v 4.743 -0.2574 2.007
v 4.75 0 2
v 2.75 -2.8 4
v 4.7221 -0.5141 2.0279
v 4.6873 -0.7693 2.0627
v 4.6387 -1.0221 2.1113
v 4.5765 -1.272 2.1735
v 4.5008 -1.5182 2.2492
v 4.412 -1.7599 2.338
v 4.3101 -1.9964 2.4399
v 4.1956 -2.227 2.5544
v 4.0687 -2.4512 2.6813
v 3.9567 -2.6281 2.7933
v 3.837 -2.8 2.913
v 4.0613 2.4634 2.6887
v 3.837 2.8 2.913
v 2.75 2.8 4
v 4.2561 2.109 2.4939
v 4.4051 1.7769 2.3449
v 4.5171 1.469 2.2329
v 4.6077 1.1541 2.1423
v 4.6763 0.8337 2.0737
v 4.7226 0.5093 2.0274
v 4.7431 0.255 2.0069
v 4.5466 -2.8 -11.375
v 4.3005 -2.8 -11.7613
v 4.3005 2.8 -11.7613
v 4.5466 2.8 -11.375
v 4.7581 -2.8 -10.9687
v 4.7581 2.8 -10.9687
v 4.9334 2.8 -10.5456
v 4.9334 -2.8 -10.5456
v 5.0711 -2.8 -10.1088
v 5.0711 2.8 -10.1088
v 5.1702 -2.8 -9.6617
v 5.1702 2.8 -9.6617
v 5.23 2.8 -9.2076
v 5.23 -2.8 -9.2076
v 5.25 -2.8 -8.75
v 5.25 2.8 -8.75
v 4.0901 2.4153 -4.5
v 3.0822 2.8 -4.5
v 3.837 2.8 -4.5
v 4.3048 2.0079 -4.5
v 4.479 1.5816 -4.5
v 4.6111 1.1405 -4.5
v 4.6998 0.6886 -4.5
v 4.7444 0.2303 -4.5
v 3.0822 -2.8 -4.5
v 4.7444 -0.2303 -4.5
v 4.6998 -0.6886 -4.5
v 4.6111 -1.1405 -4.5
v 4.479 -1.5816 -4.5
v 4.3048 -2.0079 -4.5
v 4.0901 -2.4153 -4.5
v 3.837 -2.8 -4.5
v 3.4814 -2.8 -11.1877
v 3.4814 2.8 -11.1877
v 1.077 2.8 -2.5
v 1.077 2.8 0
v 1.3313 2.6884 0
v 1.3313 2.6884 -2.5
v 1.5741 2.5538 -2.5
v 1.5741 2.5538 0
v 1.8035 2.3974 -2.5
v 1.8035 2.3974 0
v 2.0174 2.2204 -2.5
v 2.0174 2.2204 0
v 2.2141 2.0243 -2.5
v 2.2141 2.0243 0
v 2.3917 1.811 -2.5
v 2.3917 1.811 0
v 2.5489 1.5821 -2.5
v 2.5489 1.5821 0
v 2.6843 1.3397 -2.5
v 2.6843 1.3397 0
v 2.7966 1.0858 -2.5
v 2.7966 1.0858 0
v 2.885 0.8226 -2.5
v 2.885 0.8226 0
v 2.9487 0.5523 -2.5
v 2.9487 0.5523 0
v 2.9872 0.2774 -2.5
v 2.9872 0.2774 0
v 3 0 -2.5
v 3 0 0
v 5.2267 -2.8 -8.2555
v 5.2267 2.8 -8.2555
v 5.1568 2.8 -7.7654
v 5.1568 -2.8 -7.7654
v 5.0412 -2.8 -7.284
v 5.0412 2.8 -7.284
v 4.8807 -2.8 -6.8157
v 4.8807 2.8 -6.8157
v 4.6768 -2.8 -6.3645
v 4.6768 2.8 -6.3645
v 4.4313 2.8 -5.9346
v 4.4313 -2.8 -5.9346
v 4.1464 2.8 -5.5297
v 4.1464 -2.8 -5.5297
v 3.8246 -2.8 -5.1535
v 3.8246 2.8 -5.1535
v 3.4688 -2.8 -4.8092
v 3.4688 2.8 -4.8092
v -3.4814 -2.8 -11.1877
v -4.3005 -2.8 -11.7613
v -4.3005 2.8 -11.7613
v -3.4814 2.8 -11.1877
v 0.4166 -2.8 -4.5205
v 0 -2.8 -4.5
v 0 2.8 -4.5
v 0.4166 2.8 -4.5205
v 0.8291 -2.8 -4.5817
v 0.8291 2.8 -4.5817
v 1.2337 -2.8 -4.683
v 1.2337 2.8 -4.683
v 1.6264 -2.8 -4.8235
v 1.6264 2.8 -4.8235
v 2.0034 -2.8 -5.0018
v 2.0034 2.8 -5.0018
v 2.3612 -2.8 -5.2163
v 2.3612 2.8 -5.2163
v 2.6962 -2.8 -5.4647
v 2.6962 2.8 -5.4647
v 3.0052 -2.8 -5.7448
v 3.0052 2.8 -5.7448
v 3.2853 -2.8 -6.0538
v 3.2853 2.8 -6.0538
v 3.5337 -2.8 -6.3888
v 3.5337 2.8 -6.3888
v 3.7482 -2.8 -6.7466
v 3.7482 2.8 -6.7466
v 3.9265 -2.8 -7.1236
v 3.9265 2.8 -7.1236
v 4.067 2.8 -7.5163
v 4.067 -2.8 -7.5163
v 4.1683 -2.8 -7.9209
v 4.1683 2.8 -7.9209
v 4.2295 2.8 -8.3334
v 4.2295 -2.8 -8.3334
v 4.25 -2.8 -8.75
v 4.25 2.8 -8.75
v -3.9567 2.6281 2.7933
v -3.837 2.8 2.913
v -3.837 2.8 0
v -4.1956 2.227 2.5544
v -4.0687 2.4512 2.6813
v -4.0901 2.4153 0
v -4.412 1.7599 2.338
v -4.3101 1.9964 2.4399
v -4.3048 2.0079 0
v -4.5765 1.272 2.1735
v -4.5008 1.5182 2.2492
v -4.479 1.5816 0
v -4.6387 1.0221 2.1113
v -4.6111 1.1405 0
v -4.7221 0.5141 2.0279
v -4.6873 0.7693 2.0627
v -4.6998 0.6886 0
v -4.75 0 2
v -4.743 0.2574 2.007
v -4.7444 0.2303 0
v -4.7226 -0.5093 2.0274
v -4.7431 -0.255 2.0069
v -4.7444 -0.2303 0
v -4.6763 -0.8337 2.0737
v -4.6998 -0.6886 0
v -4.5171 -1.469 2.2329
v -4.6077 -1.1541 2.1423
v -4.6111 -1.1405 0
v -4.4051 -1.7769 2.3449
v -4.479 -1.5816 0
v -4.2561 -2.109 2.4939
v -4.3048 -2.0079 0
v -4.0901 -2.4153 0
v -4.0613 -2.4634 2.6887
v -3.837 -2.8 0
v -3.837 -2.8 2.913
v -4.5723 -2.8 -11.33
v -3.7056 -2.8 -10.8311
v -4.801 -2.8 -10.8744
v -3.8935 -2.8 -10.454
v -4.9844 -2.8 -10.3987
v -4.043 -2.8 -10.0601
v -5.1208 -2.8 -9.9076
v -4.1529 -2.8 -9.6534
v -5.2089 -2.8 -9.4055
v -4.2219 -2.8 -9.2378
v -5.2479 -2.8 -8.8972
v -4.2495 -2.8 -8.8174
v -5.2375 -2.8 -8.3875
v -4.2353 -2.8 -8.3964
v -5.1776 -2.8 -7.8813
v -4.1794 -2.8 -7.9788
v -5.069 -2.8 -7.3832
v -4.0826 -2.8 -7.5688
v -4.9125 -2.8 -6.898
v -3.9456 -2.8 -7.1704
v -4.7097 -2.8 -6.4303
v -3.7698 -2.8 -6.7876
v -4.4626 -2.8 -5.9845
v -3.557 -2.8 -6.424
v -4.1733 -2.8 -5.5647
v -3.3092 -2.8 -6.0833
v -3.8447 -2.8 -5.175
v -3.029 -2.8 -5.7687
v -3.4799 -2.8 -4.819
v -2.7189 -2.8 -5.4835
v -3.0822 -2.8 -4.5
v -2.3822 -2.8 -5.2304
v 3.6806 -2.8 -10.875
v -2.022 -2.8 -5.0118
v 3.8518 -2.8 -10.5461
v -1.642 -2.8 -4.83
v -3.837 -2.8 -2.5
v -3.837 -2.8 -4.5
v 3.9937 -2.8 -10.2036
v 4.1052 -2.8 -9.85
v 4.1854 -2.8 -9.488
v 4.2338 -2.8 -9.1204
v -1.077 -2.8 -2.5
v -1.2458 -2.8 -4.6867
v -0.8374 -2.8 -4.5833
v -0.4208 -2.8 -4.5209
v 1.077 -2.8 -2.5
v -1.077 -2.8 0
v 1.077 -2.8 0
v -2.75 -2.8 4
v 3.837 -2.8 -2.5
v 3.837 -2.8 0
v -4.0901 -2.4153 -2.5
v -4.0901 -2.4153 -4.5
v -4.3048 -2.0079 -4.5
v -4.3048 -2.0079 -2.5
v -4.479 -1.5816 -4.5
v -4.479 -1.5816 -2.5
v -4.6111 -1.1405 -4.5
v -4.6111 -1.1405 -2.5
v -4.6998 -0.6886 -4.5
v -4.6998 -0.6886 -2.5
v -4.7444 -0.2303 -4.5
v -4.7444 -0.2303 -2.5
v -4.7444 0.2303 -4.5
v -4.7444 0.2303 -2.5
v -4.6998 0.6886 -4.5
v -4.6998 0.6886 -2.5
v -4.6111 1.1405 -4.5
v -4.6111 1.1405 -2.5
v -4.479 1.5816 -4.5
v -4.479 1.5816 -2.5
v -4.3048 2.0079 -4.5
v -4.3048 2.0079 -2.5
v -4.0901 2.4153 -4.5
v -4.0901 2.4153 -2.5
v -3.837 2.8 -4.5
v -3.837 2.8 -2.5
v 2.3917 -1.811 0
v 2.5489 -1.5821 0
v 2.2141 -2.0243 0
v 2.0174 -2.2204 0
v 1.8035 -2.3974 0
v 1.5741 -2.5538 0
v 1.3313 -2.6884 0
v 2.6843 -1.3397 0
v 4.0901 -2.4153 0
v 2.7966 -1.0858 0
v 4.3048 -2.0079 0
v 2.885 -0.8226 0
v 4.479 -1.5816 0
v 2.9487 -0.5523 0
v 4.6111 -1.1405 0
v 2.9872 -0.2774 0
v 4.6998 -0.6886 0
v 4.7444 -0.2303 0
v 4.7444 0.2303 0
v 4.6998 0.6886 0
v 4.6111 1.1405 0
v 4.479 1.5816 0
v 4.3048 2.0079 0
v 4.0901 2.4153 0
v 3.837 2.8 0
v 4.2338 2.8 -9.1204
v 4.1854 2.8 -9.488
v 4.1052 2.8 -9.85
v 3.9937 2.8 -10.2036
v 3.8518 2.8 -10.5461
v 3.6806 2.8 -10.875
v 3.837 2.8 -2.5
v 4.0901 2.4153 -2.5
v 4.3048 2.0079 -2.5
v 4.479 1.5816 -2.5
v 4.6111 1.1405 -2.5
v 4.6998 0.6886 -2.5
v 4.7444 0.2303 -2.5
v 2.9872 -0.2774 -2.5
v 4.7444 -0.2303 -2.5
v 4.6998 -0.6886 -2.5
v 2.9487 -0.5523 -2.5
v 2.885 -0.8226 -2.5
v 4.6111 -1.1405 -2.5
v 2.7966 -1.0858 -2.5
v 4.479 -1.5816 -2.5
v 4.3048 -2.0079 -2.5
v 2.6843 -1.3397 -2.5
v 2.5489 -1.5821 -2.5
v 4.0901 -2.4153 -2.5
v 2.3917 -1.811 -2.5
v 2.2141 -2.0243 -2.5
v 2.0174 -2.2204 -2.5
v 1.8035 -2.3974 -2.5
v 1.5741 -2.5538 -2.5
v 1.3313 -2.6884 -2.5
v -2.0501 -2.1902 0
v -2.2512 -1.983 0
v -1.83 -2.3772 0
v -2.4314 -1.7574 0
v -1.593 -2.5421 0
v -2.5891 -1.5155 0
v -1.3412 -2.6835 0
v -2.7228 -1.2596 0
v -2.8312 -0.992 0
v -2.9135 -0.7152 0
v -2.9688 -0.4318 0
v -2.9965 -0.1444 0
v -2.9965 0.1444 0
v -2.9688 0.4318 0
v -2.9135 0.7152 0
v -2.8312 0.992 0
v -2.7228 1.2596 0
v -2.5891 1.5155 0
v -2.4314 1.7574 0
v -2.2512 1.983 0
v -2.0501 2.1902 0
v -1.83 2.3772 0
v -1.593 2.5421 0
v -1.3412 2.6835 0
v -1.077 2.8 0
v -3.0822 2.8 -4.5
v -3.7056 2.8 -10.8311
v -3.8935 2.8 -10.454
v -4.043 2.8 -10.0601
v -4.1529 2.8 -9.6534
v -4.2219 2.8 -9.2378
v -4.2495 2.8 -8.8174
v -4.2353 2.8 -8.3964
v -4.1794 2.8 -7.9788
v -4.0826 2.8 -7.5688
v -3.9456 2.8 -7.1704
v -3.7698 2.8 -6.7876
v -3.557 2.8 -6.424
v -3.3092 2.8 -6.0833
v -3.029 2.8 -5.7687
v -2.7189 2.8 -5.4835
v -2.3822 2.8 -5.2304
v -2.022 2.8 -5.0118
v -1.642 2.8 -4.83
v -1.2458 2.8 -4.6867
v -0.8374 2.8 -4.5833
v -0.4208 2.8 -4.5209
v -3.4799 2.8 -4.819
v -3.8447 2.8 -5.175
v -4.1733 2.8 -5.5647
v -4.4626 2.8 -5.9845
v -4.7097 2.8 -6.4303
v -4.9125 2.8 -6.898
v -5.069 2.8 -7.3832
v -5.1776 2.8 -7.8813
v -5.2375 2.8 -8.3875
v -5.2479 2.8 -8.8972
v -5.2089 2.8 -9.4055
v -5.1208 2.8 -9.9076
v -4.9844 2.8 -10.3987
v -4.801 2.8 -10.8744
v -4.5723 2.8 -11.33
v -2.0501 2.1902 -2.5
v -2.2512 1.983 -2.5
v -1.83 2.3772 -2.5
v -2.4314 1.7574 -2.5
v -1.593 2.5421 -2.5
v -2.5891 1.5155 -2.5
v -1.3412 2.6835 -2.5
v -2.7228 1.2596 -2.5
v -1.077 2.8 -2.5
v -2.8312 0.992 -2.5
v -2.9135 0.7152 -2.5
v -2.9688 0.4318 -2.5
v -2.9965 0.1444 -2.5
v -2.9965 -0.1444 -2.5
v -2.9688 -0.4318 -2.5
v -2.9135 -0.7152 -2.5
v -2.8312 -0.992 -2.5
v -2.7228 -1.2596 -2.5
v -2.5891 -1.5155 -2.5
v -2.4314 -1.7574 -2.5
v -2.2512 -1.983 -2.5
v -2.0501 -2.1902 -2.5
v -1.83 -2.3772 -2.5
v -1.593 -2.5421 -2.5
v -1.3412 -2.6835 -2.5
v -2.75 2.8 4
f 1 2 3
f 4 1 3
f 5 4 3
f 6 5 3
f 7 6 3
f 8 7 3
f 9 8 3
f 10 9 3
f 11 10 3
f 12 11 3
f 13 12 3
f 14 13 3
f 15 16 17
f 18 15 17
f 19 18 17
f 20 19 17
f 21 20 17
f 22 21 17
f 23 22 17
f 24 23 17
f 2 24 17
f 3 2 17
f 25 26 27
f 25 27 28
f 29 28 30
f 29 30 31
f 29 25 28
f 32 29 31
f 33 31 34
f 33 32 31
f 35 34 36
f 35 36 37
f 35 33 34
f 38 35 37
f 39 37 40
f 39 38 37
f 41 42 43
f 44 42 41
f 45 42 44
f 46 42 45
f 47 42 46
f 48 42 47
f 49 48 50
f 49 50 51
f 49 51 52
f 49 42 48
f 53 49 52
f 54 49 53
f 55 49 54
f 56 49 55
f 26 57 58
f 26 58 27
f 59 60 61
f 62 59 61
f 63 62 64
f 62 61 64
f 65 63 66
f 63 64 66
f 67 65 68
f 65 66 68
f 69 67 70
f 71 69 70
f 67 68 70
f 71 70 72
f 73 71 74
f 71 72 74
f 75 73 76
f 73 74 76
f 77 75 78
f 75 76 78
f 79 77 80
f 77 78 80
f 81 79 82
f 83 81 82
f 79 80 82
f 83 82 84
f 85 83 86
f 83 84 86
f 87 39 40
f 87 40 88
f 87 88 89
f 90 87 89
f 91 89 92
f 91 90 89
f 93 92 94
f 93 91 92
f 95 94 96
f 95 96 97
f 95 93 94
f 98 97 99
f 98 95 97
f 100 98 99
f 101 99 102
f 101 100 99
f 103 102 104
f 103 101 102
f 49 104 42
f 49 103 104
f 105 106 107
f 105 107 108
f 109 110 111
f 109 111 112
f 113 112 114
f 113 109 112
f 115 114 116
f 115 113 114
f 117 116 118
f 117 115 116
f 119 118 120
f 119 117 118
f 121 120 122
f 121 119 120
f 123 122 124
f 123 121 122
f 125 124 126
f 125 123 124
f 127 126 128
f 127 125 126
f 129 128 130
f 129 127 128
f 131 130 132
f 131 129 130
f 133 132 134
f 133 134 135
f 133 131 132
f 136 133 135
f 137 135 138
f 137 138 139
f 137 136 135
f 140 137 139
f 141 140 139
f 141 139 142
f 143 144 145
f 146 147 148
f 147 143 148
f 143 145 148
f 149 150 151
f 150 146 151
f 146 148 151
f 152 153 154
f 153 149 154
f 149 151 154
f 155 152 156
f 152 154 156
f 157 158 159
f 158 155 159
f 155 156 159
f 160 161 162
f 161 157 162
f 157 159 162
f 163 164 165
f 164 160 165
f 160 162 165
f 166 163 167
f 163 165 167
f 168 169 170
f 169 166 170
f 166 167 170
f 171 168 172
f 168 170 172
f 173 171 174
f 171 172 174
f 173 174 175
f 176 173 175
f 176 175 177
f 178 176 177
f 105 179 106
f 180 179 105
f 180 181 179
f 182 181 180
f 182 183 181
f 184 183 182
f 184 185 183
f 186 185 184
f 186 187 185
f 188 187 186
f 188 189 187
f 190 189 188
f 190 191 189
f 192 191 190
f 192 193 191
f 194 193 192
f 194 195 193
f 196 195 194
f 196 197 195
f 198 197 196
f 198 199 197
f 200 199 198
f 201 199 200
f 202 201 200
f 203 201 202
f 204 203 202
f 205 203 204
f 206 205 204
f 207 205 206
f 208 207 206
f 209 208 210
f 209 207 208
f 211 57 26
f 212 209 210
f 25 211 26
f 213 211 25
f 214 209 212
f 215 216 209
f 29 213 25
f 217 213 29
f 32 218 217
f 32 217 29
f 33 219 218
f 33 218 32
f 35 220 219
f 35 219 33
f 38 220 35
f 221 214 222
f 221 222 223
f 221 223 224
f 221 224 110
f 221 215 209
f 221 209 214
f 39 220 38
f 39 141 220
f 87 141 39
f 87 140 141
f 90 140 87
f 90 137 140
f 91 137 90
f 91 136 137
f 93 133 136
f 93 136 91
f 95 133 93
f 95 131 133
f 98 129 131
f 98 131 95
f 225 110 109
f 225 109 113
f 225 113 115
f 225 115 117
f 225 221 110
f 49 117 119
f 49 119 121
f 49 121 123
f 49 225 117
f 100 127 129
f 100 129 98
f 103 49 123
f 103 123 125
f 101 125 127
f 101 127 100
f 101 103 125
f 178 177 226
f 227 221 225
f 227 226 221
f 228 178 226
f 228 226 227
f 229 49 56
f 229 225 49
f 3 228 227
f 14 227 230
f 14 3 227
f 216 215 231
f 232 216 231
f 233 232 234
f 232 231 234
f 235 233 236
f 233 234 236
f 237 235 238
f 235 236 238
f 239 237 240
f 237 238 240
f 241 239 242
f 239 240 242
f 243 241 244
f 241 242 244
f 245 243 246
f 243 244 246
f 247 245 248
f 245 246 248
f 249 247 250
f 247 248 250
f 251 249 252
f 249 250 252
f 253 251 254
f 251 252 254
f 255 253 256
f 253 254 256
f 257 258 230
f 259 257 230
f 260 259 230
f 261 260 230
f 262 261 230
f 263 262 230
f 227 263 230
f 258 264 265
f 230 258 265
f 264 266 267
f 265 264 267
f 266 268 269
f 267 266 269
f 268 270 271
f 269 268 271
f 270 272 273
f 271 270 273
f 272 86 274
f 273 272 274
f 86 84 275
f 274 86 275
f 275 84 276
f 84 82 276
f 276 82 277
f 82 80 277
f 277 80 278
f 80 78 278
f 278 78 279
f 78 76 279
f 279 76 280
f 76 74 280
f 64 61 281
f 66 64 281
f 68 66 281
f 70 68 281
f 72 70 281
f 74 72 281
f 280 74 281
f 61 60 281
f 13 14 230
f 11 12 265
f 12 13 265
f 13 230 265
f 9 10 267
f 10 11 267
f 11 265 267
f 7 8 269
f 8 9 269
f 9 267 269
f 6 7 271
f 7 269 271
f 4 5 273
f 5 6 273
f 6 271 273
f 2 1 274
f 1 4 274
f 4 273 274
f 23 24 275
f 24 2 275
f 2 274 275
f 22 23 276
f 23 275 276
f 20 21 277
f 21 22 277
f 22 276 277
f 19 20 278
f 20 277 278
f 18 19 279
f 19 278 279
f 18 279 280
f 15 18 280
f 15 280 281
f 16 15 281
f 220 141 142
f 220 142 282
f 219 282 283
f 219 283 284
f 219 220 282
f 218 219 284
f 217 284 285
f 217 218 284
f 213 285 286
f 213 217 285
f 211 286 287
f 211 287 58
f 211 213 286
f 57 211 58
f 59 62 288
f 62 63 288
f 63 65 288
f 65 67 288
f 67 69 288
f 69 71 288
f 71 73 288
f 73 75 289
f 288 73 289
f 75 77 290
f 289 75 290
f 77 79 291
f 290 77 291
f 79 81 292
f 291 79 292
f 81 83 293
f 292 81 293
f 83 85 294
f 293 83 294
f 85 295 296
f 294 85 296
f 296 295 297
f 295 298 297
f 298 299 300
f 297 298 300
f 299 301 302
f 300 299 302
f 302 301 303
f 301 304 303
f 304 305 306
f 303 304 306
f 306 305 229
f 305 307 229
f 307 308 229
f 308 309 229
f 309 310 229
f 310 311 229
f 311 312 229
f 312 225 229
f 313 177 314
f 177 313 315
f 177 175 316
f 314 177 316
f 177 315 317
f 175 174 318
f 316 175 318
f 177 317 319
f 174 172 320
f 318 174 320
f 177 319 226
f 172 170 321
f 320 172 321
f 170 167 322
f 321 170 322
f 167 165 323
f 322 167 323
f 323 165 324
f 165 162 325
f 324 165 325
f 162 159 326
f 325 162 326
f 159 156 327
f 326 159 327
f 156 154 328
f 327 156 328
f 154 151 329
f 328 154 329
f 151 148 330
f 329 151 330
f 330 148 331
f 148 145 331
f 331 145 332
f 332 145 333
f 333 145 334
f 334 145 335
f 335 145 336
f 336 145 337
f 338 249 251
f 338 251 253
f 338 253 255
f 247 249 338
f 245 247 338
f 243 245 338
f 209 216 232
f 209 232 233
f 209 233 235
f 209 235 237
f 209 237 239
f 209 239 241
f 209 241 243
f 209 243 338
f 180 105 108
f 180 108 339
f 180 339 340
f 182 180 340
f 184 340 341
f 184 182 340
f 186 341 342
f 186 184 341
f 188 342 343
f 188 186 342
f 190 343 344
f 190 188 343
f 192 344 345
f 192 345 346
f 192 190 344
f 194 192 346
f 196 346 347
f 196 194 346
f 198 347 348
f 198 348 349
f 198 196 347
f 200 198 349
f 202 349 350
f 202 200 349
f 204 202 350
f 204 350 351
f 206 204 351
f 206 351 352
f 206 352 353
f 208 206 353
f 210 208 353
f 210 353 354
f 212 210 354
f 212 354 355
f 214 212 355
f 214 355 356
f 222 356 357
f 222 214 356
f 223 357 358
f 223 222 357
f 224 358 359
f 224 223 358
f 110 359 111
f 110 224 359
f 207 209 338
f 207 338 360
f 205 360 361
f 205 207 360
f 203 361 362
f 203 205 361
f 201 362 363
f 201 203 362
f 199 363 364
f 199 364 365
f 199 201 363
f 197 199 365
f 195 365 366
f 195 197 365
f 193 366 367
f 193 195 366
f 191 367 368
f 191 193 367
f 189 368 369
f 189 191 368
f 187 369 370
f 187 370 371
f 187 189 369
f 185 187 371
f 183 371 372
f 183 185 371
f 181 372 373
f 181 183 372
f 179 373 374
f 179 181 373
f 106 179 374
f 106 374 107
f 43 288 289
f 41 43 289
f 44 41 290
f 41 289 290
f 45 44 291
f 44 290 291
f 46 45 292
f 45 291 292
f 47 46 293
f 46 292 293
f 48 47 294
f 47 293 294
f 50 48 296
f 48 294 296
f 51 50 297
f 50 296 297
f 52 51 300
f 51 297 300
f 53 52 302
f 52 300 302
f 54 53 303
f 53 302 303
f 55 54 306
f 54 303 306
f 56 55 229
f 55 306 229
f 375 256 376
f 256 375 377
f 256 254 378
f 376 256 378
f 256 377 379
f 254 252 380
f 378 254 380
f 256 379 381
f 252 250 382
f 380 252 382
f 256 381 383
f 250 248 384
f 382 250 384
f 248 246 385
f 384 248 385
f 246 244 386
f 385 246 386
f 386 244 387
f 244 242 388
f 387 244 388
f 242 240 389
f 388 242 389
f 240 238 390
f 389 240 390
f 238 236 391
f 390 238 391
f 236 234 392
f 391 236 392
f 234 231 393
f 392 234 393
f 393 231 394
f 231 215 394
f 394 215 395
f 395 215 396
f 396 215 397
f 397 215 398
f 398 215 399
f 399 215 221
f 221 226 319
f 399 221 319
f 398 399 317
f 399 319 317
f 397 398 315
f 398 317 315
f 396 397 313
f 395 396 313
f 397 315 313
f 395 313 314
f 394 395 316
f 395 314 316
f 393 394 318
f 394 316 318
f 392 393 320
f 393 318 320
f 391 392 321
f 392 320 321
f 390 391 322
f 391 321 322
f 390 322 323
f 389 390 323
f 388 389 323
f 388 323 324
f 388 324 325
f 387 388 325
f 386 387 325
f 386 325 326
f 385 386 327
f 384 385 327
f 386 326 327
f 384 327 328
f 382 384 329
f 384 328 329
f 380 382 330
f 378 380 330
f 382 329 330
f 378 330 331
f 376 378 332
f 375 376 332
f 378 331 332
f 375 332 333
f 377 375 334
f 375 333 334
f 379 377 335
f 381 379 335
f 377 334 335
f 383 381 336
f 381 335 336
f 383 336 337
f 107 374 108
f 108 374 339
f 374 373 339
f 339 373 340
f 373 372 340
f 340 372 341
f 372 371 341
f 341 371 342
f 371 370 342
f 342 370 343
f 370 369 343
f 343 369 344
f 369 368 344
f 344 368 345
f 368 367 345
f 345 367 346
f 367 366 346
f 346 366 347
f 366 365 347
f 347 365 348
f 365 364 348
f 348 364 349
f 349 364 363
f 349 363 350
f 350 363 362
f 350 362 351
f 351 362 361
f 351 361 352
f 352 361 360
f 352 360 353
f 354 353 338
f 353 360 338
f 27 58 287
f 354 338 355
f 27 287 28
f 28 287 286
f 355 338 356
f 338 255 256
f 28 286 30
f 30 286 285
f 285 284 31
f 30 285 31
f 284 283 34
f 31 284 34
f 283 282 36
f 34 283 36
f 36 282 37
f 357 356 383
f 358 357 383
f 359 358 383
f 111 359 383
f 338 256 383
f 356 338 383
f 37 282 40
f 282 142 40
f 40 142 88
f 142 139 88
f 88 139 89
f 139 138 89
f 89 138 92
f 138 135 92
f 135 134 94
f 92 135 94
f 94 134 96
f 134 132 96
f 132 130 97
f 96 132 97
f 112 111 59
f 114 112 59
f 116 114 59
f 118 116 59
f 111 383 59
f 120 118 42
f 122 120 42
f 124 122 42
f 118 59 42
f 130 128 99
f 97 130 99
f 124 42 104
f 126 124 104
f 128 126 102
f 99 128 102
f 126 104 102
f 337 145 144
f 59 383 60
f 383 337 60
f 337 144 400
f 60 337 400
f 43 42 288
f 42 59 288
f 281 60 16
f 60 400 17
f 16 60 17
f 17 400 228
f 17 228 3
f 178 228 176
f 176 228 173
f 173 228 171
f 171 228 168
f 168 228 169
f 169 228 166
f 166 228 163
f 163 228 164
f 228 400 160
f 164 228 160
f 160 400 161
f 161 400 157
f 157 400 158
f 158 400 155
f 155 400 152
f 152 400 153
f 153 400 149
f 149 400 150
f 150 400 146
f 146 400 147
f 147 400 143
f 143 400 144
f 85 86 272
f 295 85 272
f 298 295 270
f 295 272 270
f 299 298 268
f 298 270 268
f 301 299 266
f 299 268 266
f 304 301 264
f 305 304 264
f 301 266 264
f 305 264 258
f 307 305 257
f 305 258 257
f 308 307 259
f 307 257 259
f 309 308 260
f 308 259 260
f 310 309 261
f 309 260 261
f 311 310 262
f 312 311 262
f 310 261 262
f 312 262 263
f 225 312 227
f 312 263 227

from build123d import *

# Parameters (mm, degrees)
F1_DEPTH = 4
F3_DEPTH = 2.5
F5_DEPTH = 2
F7_DEPTH = 5.6
F9_DEPTH = 25


with BuildPart() as f1:
    # F0 (on Top) → F1 (new body)
    with BuildSketch(Plane.XY):
        with BuildLine():
            Line((3.8369910086, 2.8), (-3.8369910086, 2.8))
            ThreePointArc((-3.8369910086, 2.8), (-4.75, 0), (-3.8369910086, -2.8))
            Line((-3.8369910086, -2.8), (3.8369910086, -2.8))
            ThreePointArc((3.8369910086, -2.8), (4.75, 0), (3.8369910086, 2.8))
        make_face()
    extrude(amount=F1_DEPTH)

    # F2 (on face) → F3 (join)
    with BuildSketch(Plane(origin=(0, 0, 0), x_dir=(1, 0, 0), z_dir=(0, 0, -1))):
        with BuildLine():
            ThreePointArc((1.0770329614, -2.8), (2.4729636961, -1.6983670268), (3, 0))
            ThreePointArc((3, 0), (2.4729636961, 1.6983670268), (1.0770329614, 2.8))
            Line((1.0770329614, 2.8), (-1.0770329614, 2.8))
            ThreePointArc((-1.0770329614, 2.8), (-3, 0), (-1.0770329614, -2.8))
            Line((-1.0770329614, -2.8), (1.0770329614, -2.8))
        make_face()
    extrude(amount=F3_DEPTH)

    # F4 (on face) → F5 (join)
    with BuildSketch(Plane(origin=(0, 0, -2.5), x_dir=(1, 0, 0), z_dir=(0, 0, -1))):
        with BuildLine():
            ThreePointArc((3.8369910086, -2.8), (4.75, 0), (3.8369910086, 2.8))
            Line((3.8369910086, 2.8), (1.0770329614, 2.8))
            Line((1.0770329614, 2.8), (-1.0770329614, 2.8))
            Line((-1.0770329614, 2.8), (-3.8369910086, 2.8))
            ThreePointArc((-3.8369910086, 2.8), (-4.75, 0), (-3.8369910086, -2.8))
            Line((-3.8369910086, -2.8), (-1.0770329614, -2.8))
            Line((-1.0770329614, -2.8), (1.0770329614, -2.8))
            Line((1.0770329614, -2.8), (3.8369910086, -2.8))
        make_face()
    extrude(amount=F5_DEPTH)

    # F6 (on face) → F7 (join)
    with BuildSketch(Plane.XZ.offset(2.8)):
        with BuildLine():
            ThreePointArc((0, -4.5), (3.00520382, -5.74479618), (4.25, -8.75))
            ThreePointArc((4.25, -8.75), (4.0532970407, -10.0279996479), (3.4813961882, -11.1876998545))
            Line((3.4813961882, -11.1876998545), (4.3005482325, -11.7612762908))
            ThreePointArc((4.3005482325, -11.7612762908), (5.0070139914, -10.3287054474), (5.25, -8.75))
            ThreePointArc((5.25, -8.75), (4.6767556467, -6.3645322008), (3.0822070015, -4.5))
            Line((3.0822070015, -4.5), (0, -4.5))
        make_face()
        with BuildLine():
            ThreePointArc((-3.4813961882, -11.1876998545), (-3.769796041, -6.7875683938), (0, -4.5))
            Line((0, -4.5), (-3.0822070015, -4.5))
            ThreePointArc((-3.0822070015, -4.5), (-5.1776251365, -7.8812664702), (-4.3005482325, -11.7612762908))
            Line((-4.3005482325, -11.7612762908), (-3.4813961882, -11.1876998545))
        make_face()
    extrude(amount=-F7_DEPTH)

    # F8 (on face) → F9 (cut)
    with BuildSketch(Plane(origin=(0, 2.8, 0), x_dir=(-1, 0, 0), z_dir=(0, 1, 0))):
        Polygon((4.75, 2), (4.75, 4), (3.8369910086, 4), (3.8369910086, 2.9130089914), align=None)
        Polygon((3.8369910086, 2.9130089914), (3.8369910086, 4), (2.75, 4), align=None)
        Polygon((-3.8369910086, 2.9130089914), (-2.75, 4), (-3.8369910086, 4), align=None)
        Polygon((-3.8369910086, 2.9130089914), (-3.8369910086, 4), (-4.75, 4), (-4.75, 2), align=None)
    extrude(amount=-F9_DEPTH, mode=Mode.SUBTRACT)


solid = f1.part
